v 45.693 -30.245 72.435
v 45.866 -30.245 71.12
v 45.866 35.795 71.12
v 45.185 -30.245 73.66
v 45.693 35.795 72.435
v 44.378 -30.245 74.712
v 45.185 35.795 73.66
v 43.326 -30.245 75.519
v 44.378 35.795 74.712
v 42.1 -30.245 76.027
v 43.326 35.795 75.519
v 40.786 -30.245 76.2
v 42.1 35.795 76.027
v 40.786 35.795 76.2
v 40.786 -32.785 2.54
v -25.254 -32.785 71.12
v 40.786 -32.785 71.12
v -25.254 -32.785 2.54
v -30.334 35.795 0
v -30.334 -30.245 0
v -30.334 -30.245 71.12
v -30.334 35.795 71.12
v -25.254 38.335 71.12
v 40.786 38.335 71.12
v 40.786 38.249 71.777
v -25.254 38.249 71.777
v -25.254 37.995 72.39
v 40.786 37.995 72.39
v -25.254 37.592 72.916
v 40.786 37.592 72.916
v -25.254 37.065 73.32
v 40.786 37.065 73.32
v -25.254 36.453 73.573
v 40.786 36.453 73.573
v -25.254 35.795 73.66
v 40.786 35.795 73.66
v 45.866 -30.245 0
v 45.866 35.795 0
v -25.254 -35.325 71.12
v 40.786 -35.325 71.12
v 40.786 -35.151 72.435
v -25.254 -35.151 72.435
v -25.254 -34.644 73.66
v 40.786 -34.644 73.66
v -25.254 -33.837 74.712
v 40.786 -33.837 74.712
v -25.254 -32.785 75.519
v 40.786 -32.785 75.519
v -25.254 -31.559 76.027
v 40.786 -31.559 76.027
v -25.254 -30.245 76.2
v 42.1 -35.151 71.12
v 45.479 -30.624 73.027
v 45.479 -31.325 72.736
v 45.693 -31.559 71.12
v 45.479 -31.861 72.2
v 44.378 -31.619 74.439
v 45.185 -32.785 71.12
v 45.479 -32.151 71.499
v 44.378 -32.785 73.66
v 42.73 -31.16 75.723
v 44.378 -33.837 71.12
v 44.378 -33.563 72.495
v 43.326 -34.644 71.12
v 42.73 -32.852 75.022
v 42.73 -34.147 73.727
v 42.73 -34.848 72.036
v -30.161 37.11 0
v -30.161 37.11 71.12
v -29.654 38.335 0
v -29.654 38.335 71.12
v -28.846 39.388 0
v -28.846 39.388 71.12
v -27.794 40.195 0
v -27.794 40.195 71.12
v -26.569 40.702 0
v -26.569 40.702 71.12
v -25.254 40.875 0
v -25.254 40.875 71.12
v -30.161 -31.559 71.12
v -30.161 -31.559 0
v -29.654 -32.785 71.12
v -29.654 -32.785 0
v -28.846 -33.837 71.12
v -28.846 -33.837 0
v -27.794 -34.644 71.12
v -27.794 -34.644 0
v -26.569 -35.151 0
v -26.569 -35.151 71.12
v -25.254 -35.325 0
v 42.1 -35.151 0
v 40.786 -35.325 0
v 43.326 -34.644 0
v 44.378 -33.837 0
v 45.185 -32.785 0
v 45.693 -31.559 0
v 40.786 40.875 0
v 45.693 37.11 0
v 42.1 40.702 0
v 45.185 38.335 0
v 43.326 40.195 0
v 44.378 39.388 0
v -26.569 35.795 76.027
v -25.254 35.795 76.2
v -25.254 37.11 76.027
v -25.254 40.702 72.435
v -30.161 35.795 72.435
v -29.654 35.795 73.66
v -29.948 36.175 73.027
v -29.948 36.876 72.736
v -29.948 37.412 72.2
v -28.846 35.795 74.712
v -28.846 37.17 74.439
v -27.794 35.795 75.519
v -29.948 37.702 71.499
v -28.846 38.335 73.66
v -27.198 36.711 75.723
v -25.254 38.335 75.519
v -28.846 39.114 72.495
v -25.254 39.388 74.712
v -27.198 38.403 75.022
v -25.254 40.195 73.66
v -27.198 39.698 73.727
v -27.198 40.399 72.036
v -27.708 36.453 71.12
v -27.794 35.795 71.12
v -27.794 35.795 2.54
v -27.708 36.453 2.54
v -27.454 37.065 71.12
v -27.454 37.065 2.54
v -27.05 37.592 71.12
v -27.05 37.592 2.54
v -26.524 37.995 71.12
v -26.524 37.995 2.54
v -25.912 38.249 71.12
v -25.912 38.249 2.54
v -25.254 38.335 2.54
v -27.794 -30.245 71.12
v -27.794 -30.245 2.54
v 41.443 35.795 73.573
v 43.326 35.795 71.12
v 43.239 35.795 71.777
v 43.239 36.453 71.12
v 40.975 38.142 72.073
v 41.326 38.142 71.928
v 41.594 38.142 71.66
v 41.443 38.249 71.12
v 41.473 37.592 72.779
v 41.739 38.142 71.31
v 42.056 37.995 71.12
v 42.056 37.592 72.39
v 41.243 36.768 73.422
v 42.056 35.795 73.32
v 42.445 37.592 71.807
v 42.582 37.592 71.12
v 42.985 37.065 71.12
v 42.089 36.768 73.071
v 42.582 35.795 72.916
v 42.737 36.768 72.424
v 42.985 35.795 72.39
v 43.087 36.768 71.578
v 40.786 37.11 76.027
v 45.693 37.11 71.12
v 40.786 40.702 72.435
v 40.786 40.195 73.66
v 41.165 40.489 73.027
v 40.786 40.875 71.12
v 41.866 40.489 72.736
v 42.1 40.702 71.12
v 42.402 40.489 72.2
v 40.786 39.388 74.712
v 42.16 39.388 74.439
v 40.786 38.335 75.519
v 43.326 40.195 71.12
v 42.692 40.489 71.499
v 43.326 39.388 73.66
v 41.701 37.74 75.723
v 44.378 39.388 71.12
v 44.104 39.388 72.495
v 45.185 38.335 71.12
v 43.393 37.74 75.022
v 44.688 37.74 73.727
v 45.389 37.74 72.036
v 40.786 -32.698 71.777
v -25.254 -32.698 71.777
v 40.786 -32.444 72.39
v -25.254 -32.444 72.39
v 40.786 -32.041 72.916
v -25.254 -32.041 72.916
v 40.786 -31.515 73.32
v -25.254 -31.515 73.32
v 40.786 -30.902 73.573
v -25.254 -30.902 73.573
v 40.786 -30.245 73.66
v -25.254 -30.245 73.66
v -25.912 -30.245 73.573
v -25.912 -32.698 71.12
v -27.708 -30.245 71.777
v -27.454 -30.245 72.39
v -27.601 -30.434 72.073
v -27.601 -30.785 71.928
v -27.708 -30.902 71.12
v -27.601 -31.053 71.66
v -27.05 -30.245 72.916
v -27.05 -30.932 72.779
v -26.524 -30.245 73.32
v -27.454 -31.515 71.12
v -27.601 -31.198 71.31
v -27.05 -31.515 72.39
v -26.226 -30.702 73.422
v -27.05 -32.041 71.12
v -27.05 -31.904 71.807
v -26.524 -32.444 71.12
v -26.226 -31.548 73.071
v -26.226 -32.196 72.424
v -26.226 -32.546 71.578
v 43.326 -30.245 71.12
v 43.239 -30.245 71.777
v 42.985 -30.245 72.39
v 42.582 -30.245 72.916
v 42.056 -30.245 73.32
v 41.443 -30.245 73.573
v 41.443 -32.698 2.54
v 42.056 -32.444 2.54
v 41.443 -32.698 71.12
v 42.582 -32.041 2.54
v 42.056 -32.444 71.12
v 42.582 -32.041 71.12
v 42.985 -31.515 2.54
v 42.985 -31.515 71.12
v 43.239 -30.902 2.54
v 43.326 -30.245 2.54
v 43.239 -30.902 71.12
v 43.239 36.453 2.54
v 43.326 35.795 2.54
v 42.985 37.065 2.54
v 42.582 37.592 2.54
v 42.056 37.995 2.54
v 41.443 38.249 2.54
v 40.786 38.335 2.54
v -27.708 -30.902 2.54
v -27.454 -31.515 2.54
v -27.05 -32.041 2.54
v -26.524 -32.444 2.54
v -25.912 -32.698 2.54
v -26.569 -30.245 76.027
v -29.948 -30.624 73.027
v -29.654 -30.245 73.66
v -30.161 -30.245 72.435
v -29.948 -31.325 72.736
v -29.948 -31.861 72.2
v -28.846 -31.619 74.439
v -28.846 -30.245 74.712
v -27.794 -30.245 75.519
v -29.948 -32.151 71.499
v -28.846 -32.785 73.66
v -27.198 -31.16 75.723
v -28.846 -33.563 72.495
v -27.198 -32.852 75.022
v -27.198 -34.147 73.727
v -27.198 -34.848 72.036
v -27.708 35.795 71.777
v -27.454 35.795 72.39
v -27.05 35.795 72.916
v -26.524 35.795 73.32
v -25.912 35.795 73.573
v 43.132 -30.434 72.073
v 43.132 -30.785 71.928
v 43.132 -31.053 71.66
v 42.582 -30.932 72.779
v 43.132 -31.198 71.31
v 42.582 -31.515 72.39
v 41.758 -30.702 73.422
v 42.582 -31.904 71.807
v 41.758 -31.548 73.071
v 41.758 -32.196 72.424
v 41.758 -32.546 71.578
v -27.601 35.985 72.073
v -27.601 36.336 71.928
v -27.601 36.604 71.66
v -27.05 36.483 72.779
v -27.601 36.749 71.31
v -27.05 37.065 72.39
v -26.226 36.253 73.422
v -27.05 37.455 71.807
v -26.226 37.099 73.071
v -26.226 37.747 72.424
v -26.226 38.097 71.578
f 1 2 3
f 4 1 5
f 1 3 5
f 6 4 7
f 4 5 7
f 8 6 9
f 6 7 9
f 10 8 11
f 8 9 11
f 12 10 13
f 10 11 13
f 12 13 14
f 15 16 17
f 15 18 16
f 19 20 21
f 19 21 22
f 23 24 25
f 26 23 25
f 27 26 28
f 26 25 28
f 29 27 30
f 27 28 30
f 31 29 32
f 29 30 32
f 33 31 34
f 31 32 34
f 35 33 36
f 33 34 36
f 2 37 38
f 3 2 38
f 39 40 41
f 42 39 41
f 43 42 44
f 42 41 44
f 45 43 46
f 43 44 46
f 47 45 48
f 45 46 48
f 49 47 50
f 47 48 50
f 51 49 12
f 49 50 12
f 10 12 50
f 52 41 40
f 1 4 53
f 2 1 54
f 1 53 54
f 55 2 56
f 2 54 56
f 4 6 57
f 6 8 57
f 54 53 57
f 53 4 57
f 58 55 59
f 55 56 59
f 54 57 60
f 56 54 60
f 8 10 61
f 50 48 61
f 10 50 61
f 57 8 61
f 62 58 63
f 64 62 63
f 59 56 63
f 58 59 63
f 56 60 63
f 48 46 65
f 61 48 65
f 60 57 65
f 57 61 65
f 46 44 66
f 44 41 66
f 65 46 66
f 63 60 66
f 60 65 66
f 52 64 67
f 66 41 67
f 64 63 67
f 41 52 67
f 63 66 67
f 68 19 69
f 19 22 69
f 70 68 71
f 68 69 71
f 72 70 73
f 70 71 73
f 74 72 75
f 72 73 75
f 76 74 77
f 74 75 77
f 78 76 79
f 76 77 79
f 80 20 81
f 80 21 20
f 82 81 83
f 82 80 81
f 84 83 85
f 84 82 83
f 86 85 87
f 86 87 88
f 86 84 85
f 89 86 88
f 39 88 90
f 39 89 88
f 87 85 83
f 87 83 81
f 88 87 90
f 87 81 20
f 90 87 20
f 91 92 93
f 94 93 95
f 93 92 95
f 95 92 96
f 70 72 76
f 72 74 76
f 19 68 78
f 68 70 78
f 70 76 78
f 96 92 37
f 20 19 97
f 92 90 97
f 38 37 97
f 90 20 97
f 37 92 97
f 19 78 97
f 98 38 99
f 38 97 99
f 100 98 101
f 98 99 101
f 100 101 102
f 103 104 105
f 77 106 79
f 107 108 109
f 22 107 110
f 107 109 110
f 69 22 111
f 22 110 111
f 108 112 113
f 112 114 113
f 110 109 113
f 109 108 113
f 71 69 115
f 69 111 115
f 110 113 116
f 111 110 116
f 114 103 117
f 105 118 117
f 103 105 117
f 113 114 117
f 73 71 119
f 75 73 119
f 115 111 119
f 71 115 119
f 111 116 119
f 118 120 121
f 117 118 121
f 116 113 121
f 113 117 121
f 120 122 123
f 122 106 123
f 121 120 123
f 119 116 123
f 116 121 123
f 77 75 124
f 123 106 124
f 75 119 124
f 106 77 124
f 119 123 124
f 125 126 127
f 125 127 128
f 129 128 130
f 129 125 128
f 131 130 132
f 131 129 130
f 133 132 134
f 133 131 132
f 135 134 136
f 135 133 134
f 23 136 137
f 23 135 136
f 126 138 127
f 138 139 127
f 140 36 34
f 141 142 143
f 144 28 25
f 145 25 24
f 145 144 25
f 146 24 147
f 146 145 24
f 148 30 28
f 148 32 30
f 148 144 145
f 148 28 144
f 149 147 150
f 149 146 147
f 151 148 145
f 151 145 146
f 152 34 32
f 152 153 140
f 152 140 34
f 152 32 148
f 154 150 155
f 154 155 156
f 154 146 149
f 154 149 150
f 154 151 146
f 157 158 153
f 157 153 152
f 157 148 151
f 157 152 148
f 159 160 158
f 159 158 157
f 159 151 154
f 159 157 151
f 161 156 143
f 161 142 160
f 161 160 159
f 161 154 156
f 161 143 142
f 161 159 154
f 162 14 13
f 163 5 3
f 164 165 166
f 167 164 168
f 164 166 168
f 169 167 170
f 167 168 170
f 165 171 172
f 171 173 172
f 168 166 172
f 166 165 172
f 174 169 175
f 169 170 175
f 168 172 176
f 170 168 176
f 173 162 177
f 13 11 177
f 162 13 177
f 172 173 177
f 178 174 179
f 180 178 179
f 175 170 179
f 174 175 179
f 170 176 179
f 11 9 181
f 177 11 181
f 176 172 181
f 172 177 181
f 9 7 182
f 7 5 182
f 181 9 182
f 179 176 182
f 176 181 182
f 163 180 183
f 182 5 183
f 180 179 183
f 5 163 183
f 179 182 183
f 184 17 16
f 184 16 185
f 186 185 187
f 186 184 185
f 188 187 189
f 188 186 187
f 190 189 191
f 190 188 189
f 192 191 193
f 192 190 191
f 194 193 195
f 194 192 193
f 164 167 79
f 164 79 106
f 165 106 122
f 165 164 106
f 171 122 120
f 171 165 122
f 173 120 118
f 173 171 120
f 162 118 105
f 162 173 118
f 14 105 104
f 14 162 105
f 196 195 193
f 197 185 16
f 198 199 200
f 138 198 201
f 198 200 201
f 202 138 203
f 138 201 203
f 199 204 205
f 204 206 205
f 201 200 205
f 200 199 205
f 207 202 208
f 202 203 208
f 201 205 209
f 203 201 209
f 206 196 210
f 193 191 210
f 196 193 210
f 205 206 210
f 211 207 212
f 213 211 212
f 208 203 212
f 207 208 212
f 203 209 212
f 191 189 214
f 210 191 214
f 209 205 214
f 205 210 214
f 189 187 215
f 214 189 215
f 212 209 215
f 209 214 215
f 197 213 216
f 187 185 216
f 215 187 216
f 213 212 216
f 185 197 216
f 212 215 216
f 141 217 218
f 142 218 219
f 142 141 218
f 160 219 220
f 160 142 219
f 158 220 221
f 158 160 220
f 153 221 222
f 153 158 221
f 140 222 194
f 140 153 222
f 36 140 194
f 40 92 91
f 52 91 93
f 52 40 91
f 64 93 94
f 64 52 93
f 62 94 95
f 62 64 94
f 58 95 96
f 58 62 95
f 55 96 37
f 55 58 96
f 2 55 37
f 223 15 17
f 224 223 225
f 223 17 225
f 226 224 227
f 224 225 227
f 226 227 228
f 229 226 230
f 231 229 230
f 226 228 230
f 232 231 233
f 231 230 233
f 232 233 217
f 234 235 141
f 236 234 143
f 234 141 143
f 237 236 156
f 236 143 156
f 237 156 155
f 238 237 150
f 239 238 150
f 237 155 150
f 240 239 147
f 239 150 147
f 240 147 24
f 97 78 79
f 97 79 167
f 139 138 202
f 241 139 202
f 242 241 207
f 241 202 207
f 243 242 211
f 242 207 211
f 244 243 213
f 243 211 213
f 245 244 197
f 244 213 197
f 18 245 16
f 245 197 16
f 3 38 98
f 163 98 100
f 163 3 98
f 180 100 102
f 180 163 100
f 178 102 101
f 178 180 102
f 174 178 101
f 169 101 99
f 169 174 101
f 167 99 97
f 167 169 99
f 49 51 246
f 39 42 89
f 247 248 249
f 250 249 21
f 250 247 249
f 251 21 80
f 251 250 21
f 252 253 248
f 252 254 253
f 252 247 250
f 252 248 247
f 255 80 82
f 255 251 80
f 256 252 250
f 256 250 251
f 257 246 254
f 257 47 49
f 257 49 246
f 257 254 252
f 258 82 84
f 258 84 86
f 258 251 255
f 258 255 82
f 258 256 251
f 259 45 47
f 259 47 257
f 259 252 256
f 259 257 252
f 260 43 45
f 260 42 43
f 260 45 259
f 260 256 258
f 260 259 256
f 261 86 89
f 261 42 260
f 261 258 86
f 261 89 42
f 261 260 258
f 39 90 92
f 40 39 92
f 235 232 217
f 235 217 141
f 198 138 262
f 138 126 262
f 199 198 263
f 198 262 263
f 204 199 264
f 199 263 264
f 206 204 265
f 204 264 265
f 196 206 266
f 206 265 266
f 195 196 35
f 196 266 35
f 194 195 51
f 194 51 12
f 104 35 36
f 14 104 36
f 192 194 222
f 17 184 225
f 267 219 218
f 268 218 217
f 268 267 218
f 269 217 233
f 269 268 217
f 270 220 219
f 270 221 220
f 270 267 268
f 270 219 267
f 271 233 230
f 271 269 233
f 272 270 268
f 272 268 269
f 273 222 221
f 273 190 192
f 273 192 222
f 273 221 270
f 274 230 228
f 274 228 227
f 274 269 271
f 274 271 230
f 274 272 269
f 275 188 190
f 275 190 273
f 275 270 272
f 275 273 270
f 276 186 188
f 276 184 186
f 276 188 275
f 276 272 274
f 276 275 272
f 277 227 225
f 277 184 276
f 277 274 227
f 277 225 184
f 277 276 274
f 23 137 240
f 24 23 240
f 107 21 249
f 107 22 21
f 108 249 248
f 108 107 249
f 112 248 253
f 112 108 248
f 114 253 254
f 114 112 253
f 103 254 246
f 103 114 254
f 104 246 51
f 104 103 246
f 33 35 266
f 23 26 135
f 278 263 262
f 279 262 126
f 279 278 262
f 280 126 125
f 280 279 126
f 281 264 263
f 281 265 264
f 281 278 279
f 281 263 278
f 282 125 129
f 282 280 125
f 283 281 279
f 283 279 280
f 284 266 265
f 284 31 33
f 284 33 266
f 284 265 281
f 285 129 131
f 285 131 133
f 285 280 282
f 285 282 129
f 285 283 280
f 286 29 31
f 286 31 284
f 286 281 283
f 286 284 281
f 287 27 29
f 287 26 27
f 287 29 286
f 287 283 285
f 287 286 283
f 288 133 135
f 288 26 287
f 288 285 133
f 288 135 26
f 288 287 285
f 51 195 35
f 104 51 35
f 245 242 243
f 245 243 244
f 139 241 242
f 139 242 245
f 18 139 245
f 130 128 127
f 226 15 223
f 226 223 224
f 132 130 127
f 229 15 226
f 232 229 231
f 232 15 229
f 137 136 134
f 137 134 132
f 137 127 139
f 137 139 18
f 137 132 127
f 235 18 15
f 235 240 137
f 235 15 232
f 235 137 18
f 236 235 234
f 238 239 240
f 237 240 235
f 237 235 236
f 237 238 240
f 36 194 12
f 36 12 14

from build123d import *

# Parameters (mm, degrees)
F0_W     = 76.2
F0_H     = 76.2
F1_DEPTH = 76.2
F2_R     = 5.08
F3_T     = -2.54


# Not quite as in the source:
# - a shell that OpenCascade refuses in one call is made with other operations: the cavity is built on its own and cut out


with BuildPart() as f1:
    # F0 (on Top) → F1 (new body)
    with BuildSketch(Plane.XY):
        with Locations((7.7656768262, 2.775496821)):
            Rectangle(F0_W, F0_H)
    extrude(amount=F1_DEPTH)

    # F2
    f2_edges = [f1.edges().sort_by_distance(p)[0] for p in [
        (7.765677, -35.324503, 76.2),
        (45.865677, 2.775497, 76.2),
        (7.765677, 40.875497, 76.2),
        (-30.334323, 2.775497, 76.2),
        (45.865677, -35.324503, 38.1),
        (-30.334323, -35.324503, 38.1),
        (45.865677, 40.875497, 38.1),
        (-30.334323, 40.875497, 38.1),
    ]]
    fillet(f2_edges, radius=F2_R)

    # F3: a shell. OpenCascade refuses it in one call, so the cavity is built on its own and cut out:
    # the body offset inwards by the wall thickness, plus a prism from it out through each open face.
    f3_core = offset(f1.part, amount=F3_T, mode=Mode.PRIVATE)
    f3_exits = [f3_core.faces().sort_by_distance(p)[0] for p in [
        (7.765677, 2.775497, 73.66),
    ]]
    add(f3_core, mode=Mode.SUBTRACT)
    extrude(f3_exits, amount=-F3_T, mode=Mode.SUBTRACT)


solid = f1.part
